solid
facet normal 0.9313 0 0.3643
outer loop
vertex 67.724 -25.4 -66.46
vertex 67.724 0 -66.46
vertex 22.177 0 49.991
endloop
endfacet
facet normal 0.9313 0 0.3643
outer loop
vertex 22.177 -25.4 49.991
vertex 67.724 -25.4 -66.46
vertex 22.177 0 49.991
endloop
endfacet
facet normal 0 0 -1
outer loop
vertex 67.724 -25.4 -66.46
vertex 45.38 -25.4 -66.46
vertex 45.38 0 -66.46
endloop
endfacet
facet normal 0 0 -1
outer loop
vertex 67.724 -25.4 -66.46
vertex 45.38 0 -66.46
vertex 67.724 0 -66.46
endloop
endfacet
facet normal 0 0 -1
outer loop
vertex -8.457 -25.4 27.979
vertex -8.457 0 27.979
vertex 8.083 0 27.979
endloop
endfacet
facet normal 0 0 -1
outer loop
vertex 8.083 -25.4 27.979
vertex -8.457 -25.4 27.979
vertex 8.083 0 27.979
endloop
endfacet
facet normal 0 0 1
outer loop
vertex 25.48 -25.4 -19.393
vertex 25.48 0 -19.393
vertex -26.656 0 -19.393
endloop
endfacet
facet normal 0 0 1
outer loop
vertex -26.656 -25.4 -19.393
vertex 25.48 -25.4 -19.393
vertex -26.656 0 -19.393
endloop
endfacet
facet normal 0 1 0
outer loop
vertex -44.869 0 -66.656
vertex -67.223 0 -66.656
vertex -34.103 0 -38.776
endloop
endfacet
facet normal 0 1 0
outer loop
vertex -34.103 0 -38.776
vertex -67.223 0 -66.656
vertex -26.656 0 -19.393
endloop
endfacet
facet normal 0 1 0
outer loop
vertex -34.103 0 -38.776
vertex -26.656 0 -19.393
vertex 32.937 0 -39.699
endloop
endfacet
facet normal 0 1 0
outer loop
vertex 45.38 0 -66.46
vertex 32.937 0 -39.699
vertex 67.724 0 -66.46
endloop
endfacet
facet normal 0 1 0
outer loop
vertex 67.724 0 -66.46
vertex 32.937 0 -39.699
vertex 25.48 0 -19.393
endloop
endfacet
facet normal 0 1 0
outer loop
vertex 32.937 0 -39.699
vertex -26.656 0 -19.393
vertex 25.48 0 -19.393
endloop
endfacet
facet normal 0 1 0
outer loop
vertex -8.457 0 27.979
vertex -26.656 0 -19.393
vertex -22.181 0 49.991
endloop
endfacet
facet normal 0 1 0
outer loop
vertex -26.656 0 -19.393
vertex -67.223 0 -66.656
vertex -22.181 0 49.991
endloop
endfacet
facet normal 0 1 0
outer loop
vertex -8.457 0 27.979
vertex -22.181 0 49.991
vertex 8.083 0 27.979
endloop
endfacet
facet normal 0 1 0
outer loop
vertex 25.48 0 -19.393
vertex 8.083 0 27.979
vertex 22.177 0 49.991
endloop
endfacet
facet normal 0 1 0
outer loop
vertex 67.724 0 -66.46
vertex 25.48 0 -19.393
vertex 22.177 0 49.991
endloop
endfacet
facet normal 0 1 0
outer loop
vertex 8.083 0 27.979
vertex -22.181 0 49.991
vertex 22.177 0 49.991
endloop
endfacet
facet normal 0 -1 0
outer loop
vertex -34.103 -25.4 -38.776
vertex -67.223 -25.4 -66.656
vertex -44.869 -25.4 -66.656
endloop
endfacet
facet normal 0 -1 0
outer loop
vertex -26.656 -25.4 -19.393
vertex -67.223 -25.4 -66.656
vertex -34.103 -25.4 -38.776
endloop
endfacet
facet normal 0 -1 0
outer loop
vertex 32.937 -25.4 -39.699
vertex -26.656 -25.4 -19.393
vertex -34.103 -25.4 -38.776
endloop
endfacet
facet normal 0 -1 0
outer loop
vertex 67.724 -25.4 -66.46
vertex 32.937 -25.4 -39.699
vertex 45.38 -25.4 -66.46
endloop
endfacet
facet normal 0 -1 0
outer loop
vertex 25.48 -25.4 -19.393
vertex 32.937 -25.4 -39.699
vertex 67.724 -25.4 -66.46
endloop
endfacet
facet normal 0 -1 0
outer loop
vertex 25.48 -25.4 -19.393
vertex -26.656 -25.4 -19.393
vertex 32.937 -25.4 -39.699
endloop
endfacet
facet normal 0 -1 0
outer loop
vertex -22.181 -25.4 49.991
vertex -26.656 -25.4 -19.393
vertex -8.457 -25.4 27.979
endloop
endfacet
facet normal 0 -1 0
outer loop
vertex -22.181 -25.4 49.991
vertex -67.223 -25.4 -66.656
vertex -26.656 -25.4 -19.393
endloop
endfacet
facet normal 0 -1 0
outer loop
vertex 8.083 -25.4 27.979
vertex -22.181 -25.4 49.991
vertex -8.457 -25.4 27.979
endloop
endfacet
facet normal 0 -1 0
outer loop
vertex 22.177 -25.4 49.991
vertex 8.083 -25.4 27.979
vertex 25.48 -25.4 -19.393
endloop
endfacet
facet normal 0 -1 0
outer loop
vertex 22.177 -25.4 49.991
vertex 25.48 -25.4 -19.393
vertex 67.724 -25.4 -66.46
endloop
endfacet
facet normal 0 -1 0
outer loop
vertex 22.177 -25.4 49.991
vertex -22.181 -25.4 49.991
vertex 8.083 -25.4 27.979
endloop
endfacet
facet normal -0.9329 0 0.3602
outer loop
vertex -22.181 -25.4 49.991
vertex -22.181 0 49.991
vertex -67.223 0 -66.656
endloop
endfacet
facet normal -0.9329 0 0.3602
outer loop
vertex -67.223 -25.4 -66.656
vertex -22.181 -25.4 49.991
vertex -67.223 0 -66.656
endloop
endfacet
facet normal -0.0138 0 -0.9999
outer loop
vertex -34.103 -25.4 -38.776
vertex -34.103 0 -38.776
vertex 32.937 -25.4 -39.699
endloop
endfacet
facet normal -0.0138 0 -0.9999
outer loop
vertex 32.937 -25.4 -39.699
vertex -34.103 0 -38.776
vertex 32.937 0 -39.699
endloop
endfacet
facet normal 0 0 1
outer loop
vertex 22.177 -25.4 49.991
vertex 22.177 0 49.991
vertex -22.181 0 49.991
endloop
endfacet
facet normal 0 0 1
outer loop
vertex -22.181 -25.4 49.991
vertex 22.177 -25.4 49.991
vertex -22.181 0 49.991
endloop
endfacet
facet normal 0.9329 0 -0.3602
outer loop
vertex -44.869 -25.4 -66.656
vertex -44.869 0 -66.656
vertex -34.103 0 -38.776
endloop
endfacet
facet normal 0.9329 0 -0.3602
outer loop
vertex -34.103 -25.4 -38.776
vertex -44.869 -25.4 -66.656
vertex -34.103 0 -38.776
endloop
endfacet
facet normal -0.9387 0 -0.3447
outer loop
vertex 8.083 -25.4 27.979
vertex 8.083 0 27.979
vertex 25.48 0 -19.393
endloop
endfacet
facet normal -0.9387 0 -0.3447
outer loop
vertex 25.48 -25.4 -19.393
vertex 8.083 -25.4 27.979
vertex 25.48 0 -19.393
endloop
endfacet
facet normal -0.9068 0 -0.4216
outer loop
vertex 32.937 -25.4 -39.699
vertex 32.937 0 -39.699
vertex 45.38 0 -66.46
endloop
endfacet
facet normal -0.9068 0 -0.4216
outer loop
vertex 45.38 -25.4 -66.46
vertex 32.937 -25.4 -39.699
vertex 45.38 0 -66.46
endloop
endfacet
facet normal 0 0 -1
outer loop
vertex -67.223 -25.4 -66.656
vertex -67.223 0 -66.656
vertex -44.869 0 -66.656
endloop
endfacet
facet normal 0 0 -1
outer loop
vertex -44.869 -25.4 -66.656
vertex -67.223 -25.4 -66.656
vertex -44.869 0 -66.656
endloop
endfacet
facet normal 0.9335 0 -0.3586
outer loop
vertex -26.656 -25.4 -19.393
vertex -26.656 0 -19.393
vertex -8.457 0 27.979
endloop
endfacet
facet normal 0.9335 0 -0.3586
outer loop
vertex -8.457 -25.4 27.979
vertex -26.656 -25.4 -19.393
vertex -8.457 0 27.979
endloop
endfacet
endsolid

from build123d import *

# Parameters (mm, degrees)
F1_DEPTH = 25.4


with BuildPart() as f1:
    # F0 (on Front) → F1 (new body)
    with BuildSketch(Plane.XZ):
        Polygon((-44.868574, -66.656321), (-34.102677, -38.775525), (32.936819, -39.698683), (45.380164, -66.460343), (67.723832, -66.460343), (22.177352, 49.990933), (0, 49.990933), (-22.180768, 49.990933), (-67.222965, -66.656321), align=None)
        Polygon((8.083392, 27.979204), (25.479969, -19.393079), (-26.656247, -19.393079), (-8.45656, 27.979204), align=None, mode=Mode.SUBTRACT)
    extrude(amount=F1_DEPTH)


solid = f1.part
